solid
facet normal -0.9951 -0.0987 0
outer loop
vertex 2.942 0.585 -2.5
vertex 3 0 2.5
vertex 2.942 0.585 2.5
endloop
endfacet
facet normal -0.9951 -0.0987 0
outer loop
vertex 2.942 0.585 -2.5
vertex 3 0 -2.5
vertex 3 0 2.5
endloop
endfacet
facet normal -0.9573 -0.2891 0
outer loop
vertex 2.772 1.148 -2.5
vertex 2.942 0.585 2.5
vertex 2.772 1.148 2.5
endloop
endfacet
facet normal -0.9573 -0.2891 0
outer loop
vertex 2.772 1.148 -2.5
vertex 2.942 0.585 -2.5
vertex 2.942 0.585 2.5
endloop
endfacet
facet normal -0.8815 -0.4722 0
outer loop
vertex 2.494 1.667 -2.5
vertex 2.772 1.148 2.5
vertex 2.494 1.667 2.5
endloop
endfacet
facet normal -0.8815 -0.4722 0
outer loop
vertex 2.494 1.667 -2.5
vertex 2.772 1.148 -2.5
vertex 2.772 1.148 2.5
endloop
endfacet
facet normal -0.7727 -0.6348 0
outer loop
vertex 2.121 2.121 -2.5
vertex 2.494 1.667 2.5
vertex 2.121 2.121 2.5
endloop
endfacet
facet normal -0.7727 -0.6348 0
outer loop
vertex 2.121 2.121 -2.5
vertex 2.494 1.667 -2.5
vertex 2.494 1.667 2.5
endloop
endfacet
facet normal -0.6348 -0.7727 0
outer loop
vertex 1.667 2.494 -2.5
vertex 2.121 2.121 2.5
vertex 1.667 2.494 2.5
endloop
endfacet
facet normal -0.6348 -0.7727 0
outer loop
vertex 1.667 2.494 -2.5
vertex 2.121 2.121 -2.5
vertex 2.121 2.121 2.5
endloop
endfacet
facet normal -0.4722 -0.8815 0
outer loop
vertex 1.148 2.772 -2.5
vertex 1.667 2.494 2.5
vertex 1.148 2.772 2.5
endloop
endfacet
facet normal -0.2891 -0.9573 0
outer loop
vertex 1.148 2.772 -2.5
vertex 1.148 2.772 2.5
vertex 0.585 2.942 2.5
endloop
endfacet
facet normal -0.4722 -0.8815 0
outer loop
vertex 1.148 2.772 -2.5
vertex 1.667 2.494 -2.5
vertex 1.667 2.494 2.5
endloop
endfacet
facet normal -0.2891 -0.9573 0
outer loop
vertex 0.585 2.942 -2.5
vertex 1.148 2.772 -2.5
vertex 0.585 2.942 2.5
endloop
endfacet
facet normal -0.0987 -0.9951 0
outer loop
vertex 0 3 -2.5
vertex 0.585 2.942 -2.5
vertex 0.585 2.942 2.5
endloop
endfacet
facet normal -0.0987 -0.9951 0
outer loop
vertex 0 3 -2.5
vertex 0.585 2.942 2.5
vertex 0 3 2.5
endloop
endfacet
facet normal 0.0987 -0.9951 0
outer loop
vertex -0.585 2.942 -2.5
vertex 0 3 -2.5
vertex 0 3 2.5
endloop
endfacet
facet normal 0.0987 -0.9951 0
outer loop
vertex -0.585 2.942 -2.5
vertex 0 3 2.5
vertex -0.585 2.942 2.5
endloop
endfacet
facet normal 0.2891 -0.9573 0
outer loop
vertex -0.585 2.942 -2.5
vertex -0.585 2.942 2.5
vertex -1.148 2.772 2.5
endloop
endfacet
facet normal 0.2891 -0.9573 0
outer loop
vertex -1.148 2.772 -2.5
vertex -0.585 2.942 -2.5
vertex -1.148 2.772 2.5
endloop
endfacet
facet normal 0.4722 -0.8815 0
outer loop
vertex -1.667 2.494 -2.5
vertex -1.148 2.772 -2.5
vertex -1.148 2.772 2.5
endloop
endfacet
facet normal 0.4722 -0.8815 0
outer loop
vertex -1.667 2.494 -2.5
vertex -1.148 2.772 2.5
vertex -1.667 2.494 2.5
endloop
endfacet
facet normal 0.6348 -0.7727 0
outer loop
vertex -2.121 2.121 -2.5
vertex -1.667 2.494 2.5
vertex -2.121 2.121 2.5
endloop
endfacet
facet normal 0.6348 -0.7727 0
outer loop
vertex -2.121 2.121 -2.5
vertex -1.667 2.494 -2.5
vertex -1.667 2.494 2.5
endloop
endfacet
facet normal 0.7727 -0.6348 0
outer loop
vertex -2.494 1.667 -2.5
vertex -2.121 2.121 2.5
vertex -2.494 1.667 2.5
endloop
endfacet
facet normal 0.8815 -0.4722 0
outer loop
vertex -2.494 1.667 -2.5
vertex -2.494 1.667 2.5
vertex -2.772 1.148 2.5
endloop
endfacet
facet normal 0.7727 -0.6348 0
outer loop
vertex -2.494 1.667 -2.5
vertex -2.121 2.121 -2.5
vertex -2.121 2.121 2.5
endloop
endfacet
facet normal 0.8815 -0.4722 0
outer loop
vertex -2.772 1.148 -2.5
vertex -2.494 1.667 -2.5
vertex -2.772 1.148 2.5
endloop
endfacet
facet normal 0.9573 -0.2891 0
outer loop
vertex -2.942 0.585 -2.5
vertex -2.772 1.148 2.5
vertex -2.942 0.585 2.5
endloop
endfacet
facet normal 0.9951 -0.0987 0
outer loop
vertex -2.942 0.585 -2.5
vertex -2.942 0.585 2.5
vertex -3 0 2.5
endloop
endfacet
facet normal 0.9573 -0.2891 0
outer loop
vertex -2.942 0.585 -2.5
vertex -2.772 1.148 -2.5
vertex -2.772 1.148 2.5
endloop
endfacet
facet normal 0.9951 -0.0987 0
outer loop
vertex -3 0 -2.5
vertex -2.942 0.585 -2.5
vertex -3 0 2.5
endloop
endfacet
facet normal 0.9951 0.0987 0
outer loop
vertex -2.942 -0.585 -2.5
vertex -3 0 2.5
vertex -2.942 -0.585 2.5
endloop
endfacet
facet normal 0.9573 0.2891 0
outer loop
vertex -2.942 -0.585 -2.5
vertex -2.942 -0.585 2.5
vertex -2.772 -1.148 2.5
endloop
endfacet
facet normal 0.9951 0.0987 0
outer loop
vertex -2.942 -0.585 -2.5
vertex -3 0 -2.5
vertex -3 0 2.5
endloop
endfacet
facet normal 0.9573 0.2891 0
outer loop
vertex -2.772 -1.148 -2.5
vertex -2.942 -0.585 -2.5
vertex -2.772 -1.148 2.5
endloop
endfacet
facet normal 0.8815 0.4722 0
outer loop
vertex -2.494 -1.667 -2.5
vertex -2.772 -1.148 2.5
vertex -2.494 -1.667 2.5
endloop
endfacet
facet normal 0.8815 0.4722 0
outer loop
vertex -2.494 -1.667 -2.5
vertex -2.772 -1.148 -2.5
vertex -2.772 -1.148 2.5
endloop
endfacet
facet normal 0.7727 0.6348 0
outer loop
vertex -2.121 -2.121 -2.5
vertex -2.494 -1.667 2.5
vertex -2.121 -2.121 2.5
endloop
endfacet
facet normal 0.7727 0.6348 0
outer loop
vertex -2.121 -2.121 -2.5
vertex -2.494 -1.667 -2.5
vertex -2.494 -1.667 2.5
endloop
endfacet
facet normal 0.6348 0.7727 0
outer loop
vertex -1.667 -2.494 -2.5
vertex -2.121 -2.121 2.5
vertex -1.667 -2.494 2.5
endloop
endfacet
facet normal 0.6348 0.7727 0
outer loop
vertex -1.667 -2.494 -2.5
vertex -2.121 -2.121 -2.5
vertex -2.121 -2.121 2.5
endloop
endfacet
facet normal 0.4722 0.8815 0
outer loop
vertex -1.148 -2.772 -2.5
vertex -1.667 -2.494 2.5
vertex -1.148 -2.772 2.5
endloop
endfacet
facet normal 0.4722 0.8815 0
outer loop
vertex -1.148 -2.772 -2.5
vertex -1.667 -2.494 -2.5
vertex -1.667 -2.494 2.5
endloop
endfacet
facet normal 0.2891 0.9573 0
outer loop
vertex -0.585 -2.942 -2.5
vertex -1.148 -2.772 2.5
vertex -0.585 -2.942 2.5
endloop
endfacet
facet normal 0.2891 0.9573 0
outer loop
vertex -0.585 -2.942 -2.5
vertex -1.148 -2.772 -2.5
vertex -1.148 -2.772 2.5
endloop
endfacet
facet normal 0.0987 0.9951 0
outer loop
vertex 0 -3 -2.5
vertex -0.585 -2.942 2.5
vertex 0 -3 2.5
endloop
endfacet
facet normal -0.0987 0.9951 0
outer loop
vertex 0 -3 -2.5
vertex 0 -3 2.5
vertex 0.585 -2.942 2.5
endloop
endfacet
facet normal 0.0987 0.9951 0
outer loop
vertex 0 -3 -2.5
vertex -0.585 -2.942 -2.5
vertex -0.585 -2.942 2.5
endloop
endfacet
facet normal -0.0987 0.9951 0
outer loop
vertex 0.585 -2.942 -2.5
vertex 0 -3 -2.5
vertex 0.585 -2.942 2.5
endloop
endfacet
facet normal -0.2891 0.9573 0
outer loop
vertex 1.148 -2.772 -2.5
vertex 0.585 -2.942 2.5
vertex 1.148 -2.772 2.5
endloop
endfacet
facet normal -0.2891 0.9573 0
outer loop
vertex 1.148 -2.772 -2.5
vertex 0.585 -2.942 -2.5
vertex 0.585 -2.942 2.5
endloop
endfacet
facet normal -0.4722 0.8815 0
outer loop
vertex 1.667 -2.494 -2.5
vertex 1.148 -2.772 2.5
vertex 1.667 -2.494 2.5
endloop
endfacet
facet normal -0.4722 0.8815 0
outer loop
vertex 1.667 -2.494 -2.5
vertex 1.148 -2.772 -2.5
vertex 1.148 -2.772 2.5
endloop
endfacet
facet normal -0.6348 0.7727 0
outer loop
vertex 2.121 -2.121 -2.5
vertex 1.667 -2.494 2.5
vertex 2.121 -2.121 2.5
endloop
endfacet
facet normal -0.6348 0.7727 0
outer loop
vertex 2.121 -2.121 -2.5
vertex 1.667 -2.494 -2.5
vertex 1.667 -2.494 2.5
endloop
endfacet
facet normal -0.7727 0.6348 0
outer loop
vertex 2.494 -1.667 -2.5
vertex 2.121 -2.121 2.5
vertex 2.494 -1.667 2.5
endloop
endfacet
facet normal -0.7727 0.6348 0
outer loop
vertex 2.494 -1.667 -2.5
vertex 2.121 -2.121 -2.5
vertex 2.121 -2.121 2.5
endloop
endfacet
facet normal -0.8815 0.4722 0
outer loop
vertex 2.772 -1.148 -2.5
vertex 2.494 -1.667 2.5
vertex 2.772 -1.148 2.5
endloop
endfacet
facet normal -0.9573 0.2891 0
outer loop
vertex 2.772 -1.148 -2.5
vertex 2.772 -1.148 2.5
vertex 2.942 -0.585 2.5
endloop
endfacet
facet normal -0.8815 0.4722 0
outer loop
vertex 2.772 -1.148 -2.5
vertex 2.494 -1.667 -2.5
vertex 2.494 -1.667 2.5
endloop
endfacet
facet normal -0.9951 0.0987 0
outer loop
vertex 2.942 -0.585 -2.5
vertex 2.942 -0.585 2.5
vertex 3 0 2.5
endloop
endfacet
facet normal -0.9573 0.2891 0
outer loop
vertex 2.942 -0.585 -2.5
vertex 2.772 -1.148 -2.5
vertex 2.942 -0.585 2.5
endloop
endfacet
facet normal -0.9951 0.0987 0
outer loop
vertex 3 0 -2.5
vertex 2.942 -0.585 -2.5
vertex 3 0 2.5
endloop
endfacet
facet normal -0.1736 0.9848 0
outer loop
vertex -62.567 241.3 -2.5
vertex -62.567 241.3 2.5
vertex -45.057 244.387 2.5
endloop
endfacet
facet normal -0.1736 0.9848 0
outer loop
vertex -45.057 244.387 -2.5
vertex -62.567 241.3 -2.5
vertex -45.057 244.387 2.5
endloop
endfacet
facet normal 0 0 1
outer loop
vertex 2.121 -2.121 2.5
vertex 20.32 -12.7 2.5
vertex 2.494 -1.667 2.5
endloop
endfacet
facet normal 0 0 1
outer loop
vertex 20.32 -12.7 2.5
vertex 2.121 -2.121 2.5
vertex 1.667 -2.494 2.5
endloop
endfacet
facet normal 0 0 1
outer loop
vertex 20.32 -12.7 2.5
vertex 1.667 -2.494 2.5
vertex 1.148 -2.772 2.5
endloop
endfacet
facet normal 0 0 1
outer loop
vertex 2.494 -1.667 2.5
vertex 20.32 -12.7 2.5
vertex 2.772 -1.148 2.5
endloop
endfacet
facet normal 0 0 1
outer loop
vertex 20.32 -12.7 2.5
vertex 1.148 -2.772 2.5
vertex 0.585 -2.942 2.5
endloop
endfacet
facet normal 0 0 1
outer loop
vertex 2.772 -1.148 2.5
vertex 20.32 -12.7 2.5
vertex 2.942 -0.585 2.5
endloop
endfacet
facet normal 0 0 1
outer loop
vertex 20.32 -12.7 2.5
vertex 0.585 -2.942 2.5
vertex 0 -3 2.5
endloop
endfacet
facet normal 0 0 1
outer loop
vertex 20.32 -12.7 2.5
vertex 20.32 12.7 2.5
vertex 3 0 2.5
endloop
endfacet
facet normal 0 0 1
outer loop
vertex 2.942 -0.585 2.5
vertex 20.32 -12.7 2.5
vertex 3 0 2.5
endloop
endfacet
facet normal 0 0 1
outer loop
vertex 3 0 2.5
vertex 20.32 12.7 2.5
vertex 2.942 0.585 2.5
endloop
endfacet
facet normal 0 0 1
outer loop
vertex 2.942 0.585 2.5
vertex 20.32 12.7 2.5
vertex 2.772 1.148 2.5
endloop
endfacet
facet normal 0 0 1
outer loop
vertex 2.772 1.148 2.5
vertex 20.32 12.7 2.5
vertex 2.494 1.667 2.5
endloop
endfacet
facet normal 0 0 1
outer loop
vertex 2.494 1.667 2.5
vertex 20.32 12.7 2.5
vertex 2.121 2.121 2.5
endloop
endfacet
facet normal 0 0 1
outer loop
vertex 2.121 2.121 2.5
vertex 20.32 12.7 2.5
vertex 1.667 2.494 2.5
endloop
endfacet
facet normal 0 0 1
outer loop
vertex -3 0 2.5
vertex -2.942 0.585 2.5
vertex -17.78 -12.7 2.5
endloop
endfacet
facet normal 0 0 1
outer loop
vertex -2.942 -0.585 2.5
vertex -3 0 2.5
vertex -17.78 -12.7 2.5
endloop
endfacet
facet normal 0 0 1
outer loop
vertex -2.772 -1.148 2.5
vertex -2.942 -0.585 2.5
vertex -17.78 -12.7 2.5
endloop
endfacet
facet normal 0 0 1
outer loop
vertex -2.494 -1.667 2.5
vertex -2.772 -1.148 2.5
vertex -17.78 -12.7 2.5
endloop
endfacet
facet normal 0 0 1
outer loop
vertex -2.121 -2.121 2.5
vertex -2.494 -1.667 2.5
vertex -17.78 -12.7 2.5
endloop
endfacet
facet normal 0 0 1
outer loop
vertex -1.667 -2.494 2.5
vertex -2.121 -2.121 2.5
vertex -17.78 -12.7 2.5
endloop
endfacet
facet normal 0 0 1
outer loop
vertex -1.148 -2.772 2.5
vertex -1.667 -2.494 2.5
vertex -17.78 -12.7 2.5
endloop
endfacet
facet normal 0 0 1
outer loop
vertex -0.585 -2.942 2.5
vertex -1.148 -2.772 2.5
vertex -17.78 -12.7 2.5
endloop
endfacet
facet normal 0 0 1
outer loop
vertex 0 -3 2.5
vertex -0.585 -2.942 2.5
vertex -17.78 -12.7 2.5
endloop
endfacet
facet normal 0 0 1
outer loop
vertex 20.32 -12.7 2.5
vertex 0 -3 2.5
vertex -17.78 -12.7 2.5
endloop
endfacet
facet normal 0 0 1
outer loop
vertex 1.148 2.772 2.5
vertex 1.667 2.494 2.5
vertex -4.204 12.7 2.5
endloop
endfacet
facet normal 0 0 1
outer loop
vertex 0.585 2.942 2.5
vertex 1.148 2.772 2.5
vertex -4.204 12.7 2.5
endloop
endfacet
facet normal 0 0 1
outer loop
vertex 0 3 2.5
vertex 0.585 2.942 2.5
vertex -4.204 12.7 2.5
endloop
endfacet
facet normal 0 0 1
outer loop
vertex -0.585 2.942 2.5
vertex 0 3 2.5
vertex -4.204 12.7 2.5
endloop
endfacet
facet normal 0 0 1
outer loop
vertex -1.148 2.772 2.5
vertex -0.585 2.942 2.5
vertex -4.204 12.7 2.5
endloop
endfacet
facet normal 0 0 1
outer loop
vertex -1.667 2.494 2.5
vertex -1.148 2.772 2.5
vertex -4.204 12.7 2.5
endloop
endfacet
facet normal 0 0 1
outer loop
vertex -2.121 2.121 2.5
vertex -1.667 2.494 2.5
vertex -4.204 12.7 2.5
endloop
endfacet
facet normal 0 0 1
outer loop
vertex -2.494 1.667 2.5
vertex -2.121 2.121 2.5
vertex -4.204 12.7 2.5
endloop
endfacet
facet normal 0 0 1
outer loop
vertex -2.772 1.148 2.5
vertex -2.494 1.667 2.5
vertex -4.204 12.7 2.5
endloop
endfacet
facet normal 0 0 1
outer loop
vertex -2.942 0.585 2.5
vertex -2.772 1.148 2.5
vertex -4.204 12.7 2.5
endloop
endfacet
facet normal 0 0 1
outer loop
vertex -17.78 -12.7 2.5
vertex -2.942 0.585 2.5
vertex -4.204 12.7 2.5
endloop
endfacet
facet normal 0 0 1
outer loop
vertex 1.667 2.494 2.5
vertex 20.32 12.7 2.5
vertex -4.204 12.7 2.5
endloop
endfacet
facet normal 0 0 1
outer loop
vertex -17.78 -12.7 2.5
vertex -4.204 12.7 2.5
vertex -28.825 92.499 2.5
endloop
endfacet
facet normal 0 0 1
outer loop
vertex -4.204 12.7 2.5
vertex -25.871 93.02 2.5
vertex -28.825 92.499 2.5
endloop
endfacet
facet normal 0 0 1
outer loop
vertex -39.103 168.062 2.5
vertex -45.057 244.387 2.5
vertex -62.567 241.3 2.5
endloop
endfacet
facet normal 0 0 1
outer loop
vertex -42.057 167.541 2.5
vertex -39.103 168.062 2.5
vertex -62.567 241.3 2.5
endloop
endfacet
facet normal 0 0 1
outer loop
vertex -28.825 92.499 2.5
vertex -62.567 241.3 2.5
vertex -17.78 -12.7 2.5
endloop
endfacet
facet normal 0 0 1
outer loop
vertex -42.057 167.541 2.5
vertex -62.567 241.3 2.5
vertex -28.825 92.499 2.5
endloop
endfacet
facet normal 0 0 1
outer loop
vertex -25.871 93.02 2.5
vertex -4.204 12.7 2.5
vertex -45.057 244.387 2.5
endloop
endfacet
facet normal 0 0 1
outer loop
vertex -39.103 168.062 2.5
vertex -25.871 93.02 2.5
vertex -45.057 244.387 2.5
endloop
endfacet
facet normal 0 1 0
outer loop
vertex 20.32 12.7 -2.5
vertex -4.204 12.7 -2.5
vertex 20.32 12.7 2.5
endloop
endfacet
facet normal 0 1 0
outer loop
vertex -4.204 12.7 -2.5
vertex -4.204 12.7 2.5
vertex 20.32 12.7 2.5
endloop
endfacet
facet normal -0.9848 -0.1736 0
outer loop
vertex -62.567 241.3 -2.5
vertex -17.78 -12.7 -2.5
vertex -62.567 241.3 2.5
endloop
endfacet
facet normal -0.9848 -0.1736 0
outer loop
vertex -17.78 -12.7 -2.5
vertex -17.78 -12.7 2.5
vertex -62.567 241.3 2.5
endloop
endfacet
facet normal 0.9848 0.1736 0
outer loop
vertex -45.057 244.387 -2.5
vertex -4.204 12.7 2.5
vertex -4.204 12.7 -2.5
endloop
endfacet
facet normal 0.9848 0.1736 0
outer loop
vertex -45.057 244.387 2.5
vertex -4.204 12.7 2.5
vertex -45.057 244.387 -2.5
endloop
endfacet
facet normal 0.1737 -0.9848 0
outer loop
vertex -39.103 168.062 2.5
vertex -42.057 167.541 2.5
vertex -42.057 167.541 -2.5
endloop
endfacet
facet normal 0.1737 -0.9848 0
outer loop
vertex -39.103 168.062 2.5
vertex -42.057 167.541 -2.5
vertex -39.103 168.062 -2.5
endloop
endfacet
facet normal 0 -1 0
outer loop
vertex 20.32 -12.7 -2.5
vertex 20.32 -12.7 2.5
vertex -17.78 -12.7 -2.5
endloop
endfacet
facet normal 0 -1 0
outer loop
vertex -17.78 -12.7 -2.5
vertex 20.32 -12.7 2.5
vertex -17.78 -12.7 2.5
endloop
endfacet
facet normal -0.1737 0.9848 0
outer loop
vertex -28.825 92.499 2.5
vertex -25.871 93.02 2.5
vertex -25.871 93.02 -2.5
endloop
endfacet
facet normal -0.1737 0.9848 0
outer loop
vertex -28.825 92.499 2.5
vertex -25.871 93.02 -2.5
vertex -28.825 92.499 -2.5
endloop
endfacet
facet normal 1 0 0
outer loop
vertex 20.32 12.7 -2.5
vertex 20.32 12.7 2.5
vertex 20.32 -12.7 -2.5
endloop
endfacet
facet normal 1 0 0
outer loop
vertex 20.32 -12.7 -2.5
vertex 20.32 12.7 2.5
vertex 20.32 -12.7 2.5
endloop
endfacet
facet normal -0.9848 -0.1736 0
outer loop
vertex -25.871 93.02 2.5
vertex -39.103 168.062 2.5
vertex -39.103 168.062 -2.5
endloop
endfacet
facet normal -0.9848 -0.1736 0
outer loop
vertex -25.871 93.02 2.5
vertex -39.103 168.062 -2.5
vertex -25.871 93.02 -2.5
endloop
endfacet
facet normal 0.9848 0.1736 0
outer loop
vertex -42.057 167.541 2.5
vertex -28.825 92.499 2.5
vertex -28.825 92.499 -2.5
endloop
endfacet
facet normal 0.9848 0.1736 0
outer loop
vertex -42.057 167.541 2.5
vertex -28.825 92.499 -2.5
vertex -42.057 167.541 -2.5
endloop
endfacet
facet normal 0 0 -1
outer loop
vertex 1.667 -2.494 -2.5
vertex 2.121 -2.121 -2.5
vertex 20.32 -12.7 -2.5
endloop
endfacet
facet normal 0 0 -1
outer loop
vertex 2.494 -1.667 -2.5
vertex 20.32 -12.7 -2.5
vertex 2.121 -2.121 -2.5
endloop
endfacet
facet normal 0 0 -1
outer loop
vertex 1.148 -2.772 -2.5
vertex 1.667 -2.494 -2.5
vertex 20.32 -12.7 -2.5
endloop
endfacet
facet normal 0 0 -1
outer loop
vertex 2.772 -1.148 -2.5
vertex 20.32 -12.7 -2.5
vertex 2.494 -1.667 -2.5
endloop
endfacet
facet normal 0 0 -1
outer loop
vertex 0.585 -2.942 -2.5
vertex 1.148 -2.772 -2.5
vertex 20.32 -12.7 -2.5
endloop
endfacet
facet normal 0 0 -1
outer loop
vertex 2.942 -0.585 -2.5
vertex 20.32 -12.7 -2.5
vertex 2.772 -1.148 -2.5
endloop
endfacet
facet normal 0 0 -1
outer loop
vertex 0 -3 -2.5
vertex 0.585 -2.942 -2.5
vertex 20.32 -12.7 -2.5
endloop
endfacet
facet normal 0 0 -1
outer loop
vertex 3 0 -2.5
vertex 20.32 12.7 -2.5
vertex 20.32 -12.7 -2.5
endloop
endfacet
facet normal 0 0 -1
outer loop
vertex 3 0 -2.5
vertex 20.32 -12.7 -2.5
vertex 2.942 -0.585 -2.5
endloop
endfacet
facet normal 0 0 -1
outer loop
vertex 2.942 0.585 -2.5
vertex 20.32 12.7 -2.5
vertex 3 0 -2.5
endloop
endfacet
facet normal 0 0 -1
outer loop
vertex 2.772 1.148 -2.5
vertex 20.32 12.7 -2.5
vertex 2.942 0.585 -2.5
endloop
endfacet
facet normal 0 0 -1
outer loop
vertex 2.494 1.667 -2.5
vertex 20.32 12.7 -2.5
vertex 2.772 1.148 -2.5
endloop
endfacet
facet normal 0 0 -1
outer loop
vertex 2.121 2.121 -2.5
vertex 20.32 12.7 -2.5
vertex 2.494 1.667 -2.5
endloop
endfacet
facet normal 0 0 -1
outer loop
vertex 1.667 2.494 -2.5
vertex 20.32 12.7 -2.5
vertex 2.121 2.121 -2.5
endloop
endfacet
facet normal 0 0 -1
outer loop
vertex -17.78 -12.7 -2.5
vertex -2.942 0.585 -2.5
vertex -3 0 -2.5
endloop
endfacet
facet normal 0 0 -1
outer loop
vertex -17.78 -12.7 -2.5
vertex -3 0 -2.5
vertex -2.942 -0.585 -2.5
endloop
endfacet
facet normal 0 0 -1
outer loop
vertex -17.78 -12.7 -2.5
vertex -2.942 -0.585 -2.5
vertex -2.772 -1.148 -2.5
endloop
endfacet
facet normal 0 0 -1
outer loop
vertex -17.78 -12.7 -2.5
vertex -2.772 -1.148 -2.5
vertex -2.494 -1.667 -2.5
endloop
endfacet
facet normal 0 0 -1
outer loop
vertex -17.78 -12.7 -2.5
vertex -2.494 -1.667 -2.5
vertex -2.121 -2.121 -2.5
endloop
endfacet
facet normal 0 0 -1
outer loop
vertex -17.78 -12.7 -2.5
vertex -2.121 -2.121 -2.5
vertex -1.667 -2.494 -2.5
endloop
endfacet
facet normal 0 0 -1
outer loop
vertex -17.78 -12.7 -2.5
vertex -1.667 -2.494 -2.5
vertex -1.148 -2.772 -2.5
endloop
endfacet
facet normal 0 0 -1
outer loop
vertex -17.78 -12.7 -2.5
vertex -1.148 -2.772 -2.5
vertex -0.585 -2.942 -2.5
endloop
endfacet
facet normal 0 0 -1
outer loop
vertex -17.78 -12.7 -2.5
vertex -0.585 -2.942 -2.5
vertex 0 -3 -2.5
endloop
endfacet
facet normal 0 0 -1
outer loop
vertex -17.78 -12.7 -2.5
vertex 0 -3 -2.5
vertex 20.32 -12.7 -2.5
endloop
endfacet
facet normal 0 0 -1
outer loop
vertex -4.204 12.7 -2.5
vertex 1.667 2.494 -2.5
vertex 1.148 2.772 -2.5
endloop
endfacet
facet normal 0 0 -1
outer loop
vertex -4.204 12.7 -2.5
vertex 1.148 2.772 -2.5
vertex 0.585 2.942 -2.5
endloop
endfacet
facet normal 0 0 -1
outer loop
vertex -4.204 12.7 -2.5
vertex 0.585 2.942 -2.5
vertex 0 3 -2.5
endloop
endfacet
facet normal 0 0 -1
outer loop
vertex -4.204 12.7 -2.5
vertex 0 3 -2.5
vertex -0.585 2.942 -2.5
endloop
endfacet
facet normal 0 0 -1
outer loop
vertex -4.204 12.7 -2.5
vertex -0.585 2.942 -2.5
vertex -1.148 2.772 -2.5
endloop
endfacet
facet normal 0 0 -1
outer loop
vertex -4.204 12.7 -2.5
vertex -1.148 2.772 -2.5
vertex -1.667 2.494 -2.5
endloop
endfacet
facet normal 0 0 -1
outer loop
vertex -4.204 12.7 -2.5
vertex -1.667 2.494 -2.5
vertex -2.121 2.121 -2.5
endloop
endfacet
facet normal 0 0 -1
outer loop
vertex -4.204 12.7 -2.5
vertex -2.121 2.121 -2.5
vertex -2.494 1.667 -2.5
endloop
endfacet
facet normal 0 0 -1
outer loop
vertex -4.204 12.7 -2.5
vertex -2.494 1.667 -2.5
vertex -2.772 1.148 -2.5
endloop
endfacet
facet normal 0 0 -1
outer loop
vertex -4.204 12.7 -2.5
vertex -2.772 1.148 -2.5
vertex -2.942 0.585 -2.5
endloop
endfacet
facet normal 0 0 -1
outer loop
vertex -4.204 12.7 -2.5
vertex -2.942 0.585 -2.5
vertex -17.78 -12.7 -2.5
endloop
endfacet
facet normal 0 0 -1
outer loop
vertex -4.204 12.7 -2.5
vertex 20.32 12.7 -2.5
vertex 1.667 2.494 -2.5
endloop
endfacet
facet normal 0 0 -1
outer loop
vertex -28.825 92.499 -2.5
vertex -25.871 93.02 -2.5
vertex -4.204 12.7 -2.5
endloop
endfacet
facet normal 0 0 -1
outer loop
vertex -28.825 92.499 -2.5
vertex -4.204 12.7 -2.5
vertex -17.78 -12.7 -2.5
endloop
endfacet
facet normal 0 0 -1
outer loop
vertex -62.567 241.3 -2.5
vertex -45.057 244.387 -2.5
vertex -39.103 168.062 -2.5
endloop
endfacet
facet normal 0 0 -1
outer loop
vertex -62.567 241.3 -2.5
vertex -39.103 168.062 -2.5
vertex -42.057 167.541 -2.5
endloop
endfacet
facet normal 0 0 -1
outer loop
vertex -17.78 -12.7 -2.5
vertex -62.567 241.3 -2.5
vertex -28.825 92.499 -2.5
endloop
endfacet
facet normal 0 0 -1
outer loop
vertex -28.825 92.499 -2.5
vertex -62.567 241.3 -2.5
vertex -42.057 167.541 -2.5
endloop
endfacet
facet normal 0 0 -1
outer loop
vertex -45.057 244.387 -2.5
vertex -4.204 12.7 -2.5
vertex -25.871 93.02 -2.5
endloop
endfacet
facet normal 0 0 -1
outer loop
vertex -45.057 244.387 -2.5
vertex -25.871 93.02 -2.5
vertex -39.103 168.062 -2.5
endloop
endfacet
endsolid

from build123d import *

# Parameters (mm, degrees)
SKETCH1_R           = 3
BOSS_EXTRUDE1_DEPTH = 2.5
CUT_EXTRUDE1_DEPTH  = 6
CUT_EXTRUDE2_DEPTH  = 25.4


with BuildPart() as part:
    # Sketch1 → Boss-Extrude1 (new body, symmetric)
    with BuildSketch(Plane.XY):
        Polygon((20.32, 12.7), (20.32, -12.7), (-17.78, -12.7), (-62.5670531, 241.3), (-37.552936173, 245.710663713), (3.533130632, 12.7), align=None)
        Circle(SKETCH1_R, mode=Mode.SUBTRACT)
    extrude(amount=BOSS_EXTRUDE1_DEPTH, both=True)

    # Sketch2 → Cut-Extrude1 (cut, through all)
    with BuildSketch(Plane.XY.offset(2.5)):
        Polygon((-37.552936173, 245.710663713), (3.533130632, 12.7), (-4.204420151, 12.7), (-45.057171251, 244.387464599), align=None)
    extrude(amount=-CUT_EXTRUDE1_DEPTH, mode=Mode.SUBTRACT)

    # Sketch3 → Cut-Extrude2 (cut, symmetric)
    with BuildSketch(Plane.XY):
        Polygon((-42.057332667, 167.540909253), (-39.102909408, 168.061853786), (-25.87091827, 93.019503007), (-28.825341529, 92.498558474), align=None)
    extrude(amount=CUT_EXTRUDE2_DEPTH, both=True, mode=Mode.SUBTRACT)


solid = part.part
